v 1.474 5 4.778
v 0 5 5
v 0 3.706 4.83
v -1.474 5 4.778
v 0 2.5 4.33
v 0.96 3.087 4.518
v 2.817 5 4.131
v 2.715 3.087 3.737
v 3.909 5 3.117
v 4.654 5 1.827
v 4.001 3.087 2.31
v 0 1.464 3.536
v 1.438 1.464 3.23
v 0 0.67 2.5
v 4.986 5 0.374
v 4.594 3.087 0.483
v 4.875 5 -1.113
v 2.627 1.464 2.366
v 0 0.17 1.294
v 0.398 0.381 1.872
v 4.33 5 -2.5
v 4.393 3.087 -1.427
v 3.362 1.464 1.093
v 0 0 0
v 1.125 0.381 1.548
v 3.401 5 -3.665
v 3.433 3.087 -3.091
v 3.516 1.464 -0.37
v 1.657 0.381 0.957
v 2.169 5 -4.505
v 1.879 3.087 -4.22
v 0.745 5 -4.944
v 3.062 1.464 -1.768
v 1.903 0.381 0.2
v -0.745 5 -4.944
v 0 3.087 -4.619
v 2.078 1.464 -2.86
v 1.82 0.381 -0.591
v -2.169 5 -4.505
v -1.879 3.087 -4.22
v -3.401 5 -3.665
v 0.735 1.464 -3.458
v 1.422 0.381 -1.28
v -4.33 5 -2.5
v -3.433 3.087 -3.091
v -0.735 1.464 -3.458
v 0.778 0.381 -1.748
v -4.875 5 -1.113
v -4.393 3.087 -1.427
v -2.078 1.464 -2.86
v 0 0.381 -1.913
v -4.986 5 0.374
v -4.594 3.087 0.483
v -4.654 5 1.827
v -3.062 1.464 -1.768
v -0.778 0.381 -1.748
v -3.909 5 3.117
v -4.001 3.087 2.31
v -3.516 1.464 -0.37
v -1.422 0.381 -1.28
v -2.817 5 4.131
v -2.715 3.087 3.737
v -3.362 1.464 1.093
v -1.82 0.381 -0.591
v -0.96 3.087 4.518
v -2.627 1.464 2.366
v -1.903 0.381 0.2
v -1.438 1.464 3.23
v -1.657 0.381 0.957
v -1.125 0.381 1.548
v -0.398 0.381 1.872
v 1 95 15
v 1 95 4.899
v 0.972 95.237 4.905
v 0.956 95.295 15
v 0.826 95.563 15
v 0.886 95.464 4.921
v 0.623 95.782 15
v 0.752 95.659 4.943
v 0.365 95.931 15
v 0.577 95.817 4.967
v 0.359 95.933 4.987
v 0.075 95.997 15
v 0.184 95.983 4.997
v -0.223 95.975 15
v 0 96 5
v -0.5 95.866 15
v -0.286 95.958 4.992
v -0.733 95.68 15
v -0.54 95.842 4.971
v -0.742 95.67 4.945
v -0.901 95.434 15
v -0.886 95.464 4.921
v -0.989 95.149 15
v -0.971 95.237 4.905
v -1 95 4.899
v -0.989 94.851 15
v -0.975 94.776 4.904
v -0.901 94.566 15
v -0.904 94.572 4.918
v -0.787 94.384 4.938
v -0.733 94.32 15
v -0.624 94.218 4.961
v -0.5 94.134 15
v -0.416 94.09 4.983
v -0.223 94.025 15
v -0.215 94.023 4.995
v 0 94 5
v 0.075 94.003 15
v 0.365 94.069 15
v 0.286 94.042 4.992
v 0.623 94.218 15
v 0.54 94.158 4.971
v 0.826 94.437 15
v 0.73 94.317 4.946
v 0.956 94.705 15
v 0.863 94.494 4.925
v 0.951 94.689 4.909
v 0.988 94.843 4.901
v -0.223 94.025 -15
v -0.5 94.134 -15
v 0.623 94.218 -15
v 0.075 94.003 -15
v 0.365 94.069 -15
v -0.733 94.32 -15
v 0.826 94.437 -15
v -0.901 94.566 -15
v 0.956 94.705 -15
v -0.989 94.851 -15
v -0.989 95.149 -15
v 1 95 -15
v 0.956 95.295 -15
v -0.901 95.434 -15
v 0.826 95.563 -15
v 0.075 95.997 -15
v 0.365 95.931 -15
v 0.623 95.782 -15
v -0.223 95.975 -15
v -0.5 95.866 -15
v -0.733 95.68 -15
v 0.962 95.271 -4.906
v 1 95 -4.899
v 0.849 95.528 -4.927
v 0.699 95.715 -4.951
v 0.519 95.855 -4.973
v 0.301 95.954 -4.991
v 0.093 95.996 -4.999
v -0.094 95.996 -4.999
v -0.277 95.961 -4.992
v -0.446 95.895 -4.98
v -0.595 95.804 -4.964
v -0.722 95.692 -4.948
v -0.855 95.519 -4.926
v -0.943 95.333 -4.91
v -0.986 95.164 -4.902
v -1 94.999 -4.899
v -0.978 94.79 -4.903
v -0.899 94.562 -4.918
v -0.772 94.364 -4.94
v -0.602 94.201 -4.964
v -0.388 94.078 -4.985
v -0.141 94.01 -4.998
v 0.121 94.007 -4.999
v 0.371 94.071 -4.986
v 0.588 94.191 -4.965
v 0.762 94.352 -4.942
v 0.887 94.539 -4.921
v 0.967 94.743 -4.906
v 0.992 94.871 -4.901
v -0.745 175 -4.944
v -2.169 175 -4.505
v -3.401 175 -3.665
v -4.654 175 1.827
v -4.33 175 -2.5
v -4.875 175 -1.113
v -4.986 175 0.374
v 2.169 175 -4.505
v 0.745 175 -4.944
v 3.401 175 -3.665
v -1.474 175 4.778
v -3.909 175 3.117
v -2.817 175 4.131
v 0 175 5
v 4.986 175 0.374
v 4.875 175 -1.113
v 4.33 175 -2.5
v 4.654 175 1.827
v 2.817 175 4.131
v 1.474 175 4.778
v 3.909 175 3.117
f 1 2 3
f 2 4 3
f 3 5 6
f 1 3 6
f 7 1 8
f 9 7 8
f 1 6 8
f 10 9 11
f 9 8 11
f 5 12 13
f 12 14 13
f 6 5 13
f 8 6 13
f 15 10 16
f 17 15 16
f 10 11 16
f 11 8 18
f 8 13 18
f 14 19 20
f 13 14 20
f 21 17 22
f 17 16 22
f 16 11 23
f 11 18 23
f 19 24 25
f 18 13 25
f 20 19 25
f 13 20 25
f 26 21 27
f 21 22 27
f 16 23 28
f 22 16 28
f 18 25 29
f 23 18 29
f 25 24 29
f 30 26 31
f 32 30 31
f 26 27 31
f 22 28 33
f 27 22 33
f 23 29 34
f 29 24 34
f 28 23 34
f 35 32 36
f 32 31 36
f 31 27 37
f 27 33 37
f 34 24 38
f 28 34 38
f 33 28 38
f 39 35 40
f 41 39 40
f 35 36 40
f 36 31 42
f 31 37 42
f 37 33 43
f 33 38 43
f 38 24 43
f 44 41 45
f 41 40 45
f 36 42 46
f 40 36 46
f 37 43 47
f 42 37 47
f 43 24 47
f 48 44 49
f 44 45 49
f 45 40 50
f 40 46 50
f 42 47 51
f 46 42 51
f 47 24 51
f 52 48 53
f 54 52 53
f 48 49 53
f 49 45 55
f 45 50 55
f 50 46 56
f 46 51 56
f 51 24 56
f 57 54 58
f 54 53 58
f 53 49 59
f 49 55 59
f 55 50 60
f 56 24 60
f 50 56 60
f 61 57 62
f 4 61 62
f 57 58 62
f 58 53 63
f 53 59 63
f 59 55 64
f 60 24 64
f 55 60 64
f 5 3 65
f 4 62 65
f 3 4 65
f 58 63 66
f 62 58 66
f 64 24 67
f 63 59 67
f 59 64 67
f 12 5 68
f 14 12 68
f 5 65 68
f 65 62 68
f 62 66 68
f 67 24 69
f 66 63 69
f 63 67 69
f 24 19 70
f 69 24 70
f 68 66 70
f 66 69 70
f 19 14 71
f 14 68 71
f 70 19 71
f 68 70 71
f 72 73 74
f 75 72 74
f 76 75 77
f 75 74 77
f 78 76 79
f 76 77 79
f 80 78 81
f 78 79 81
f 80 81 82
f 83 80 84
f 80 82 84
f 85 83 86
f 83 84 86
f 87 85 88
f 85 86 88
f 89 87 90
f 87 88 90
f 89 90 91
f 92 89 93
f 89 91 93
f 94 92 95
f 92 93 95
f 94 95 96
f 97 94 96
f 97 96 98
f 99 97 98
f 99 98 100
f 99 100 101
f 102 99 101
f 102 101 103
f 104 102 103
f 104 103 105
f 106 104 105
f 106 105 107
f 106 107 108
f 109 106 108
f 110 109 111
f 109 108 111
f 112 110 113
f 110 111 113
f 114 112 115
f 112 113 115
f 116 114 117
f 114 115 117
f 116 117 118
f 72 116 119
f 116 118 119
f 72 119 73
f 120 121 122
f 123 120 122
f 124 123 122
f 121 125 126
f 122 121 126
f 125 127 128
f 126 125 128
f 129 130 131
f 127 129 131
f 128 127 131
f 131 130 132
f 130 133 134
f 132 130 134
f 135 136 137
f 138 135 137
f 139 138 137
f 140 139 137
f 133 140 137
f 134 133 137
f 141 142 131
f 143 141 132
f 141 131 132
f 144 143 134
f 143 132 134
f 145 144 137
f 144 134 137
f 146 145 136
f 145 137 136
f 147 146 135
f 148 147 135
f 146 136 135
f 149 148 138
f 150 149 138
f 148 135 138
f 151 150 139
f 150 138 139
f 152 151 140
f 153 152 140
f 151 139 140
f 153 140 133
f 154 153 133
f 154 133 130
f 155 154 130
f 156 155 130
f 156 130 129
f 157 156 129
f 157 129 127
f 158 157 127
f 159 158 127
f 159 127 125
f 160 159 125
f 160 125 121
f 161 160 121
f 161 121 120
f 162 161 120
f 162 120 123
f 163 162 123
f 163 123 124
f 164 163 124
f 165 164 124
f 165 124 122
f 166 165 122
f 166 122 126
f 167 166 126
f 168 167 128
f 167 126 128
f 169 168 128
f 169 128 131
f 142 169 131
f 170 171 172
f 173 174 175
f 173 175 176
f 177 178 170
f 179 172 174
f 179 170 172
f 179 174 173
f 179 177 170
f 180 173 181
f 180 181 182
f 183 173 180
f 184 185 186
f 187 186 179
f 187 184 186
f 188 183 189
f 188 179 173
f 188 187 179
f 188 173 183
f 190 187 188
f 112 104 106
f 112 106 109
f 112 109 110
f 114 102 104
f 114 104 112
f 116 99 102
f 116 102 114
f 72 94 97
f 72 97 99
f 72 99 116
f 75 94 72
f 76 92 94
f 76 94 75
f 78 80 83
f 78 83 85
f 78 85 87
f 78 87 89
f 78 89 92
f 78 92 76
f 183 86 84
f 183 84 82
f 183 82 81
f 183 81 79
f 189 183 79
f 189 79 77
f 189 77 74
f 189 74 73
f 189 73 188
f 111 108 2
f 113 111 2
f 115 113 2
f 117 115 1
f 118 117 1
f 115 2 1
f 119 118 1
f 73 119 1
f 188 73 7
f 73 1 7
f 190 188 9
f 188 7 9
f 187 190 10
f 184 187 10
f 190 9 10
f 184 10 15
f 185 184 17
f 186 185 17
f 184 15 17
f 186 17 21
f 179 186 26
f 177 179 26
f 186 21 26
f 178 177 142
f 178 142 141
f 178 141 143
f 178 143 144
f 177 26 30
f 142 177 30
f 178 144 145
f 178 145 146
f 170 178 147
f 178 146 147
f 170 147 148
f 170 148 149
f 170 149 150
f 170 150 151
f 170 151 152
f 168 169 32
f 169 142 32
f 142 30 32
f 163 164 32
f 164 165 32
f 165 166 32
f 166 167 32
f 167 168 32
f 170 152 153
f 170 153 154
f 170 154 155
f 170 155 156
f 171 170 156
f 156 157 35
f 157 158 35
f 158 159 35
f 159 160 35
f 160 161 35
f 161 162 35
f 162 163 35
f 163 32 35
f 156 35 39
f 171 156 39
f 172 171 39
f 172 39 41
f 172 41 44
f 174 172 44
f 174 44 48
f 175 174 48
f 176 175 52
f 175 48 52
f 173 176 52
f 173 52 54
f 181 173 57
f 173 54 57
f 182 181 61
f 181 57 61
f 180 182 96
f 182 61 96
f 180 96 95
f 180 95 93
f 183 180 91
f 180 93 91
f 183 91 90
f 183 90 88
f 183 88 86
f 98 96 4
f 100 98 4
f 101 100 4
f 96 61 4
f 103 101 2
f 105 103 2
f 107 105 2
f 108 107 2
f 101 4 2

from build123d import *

# Parameters (mm, degrees)
SZKIC2_R                         = 5
DODANIE_WYCI_GNI_CIE1_DEPTH      = 175
DODANIE_WYCI_GNI_CIE2_DEPTH      = 15
DODANIE_WYCI_GNI_CIE2_DEPTH_BACK = 15
SZKIC3_R                         = 1
ZAOKR_GLENIE1_R                  = 5


with BuildPart() as part:
    # Szkic2 → Dodanie-wyciągnięcie1 (new body)
    with BuildSketch(Plane(origin=(0, 0, 0), x_dir=(1, 0, 0), z_dir=(0, 1, 0))):
        Circle(SZKIC2_R)
    extrude(amount=DODANIE_WYCI_GNI_CIE1_DEPTH)

    # Szkic3 → Dodanie-wyciągnięcie2 (add, two sides: drawn at the far end of the back side and taken through both)
    with BuildSketch(Plane.XY.offset(-DODANIE_WYCI_GNI_CIE2_DEPTH_BACK)):
        with Locations((0, 95)):
            Circle(SZKIC3_R)
    extrude(amount=DODANIE_WYCI_GNI_CIE2_DEPTH + DODANIE_WYCI_GNI_CIE2_DEPTH_BACK)

    # Zaokrąglenie1
    zaokr_glenie1_edges = [part.edges().sort_by_distance(p)[0] for p in [
        (-5, 0, 0),
    ]]
    fillet(zaokr_glenie1_edges, radius=ZAOKR_GLENIE1_R)


solid = part.part
